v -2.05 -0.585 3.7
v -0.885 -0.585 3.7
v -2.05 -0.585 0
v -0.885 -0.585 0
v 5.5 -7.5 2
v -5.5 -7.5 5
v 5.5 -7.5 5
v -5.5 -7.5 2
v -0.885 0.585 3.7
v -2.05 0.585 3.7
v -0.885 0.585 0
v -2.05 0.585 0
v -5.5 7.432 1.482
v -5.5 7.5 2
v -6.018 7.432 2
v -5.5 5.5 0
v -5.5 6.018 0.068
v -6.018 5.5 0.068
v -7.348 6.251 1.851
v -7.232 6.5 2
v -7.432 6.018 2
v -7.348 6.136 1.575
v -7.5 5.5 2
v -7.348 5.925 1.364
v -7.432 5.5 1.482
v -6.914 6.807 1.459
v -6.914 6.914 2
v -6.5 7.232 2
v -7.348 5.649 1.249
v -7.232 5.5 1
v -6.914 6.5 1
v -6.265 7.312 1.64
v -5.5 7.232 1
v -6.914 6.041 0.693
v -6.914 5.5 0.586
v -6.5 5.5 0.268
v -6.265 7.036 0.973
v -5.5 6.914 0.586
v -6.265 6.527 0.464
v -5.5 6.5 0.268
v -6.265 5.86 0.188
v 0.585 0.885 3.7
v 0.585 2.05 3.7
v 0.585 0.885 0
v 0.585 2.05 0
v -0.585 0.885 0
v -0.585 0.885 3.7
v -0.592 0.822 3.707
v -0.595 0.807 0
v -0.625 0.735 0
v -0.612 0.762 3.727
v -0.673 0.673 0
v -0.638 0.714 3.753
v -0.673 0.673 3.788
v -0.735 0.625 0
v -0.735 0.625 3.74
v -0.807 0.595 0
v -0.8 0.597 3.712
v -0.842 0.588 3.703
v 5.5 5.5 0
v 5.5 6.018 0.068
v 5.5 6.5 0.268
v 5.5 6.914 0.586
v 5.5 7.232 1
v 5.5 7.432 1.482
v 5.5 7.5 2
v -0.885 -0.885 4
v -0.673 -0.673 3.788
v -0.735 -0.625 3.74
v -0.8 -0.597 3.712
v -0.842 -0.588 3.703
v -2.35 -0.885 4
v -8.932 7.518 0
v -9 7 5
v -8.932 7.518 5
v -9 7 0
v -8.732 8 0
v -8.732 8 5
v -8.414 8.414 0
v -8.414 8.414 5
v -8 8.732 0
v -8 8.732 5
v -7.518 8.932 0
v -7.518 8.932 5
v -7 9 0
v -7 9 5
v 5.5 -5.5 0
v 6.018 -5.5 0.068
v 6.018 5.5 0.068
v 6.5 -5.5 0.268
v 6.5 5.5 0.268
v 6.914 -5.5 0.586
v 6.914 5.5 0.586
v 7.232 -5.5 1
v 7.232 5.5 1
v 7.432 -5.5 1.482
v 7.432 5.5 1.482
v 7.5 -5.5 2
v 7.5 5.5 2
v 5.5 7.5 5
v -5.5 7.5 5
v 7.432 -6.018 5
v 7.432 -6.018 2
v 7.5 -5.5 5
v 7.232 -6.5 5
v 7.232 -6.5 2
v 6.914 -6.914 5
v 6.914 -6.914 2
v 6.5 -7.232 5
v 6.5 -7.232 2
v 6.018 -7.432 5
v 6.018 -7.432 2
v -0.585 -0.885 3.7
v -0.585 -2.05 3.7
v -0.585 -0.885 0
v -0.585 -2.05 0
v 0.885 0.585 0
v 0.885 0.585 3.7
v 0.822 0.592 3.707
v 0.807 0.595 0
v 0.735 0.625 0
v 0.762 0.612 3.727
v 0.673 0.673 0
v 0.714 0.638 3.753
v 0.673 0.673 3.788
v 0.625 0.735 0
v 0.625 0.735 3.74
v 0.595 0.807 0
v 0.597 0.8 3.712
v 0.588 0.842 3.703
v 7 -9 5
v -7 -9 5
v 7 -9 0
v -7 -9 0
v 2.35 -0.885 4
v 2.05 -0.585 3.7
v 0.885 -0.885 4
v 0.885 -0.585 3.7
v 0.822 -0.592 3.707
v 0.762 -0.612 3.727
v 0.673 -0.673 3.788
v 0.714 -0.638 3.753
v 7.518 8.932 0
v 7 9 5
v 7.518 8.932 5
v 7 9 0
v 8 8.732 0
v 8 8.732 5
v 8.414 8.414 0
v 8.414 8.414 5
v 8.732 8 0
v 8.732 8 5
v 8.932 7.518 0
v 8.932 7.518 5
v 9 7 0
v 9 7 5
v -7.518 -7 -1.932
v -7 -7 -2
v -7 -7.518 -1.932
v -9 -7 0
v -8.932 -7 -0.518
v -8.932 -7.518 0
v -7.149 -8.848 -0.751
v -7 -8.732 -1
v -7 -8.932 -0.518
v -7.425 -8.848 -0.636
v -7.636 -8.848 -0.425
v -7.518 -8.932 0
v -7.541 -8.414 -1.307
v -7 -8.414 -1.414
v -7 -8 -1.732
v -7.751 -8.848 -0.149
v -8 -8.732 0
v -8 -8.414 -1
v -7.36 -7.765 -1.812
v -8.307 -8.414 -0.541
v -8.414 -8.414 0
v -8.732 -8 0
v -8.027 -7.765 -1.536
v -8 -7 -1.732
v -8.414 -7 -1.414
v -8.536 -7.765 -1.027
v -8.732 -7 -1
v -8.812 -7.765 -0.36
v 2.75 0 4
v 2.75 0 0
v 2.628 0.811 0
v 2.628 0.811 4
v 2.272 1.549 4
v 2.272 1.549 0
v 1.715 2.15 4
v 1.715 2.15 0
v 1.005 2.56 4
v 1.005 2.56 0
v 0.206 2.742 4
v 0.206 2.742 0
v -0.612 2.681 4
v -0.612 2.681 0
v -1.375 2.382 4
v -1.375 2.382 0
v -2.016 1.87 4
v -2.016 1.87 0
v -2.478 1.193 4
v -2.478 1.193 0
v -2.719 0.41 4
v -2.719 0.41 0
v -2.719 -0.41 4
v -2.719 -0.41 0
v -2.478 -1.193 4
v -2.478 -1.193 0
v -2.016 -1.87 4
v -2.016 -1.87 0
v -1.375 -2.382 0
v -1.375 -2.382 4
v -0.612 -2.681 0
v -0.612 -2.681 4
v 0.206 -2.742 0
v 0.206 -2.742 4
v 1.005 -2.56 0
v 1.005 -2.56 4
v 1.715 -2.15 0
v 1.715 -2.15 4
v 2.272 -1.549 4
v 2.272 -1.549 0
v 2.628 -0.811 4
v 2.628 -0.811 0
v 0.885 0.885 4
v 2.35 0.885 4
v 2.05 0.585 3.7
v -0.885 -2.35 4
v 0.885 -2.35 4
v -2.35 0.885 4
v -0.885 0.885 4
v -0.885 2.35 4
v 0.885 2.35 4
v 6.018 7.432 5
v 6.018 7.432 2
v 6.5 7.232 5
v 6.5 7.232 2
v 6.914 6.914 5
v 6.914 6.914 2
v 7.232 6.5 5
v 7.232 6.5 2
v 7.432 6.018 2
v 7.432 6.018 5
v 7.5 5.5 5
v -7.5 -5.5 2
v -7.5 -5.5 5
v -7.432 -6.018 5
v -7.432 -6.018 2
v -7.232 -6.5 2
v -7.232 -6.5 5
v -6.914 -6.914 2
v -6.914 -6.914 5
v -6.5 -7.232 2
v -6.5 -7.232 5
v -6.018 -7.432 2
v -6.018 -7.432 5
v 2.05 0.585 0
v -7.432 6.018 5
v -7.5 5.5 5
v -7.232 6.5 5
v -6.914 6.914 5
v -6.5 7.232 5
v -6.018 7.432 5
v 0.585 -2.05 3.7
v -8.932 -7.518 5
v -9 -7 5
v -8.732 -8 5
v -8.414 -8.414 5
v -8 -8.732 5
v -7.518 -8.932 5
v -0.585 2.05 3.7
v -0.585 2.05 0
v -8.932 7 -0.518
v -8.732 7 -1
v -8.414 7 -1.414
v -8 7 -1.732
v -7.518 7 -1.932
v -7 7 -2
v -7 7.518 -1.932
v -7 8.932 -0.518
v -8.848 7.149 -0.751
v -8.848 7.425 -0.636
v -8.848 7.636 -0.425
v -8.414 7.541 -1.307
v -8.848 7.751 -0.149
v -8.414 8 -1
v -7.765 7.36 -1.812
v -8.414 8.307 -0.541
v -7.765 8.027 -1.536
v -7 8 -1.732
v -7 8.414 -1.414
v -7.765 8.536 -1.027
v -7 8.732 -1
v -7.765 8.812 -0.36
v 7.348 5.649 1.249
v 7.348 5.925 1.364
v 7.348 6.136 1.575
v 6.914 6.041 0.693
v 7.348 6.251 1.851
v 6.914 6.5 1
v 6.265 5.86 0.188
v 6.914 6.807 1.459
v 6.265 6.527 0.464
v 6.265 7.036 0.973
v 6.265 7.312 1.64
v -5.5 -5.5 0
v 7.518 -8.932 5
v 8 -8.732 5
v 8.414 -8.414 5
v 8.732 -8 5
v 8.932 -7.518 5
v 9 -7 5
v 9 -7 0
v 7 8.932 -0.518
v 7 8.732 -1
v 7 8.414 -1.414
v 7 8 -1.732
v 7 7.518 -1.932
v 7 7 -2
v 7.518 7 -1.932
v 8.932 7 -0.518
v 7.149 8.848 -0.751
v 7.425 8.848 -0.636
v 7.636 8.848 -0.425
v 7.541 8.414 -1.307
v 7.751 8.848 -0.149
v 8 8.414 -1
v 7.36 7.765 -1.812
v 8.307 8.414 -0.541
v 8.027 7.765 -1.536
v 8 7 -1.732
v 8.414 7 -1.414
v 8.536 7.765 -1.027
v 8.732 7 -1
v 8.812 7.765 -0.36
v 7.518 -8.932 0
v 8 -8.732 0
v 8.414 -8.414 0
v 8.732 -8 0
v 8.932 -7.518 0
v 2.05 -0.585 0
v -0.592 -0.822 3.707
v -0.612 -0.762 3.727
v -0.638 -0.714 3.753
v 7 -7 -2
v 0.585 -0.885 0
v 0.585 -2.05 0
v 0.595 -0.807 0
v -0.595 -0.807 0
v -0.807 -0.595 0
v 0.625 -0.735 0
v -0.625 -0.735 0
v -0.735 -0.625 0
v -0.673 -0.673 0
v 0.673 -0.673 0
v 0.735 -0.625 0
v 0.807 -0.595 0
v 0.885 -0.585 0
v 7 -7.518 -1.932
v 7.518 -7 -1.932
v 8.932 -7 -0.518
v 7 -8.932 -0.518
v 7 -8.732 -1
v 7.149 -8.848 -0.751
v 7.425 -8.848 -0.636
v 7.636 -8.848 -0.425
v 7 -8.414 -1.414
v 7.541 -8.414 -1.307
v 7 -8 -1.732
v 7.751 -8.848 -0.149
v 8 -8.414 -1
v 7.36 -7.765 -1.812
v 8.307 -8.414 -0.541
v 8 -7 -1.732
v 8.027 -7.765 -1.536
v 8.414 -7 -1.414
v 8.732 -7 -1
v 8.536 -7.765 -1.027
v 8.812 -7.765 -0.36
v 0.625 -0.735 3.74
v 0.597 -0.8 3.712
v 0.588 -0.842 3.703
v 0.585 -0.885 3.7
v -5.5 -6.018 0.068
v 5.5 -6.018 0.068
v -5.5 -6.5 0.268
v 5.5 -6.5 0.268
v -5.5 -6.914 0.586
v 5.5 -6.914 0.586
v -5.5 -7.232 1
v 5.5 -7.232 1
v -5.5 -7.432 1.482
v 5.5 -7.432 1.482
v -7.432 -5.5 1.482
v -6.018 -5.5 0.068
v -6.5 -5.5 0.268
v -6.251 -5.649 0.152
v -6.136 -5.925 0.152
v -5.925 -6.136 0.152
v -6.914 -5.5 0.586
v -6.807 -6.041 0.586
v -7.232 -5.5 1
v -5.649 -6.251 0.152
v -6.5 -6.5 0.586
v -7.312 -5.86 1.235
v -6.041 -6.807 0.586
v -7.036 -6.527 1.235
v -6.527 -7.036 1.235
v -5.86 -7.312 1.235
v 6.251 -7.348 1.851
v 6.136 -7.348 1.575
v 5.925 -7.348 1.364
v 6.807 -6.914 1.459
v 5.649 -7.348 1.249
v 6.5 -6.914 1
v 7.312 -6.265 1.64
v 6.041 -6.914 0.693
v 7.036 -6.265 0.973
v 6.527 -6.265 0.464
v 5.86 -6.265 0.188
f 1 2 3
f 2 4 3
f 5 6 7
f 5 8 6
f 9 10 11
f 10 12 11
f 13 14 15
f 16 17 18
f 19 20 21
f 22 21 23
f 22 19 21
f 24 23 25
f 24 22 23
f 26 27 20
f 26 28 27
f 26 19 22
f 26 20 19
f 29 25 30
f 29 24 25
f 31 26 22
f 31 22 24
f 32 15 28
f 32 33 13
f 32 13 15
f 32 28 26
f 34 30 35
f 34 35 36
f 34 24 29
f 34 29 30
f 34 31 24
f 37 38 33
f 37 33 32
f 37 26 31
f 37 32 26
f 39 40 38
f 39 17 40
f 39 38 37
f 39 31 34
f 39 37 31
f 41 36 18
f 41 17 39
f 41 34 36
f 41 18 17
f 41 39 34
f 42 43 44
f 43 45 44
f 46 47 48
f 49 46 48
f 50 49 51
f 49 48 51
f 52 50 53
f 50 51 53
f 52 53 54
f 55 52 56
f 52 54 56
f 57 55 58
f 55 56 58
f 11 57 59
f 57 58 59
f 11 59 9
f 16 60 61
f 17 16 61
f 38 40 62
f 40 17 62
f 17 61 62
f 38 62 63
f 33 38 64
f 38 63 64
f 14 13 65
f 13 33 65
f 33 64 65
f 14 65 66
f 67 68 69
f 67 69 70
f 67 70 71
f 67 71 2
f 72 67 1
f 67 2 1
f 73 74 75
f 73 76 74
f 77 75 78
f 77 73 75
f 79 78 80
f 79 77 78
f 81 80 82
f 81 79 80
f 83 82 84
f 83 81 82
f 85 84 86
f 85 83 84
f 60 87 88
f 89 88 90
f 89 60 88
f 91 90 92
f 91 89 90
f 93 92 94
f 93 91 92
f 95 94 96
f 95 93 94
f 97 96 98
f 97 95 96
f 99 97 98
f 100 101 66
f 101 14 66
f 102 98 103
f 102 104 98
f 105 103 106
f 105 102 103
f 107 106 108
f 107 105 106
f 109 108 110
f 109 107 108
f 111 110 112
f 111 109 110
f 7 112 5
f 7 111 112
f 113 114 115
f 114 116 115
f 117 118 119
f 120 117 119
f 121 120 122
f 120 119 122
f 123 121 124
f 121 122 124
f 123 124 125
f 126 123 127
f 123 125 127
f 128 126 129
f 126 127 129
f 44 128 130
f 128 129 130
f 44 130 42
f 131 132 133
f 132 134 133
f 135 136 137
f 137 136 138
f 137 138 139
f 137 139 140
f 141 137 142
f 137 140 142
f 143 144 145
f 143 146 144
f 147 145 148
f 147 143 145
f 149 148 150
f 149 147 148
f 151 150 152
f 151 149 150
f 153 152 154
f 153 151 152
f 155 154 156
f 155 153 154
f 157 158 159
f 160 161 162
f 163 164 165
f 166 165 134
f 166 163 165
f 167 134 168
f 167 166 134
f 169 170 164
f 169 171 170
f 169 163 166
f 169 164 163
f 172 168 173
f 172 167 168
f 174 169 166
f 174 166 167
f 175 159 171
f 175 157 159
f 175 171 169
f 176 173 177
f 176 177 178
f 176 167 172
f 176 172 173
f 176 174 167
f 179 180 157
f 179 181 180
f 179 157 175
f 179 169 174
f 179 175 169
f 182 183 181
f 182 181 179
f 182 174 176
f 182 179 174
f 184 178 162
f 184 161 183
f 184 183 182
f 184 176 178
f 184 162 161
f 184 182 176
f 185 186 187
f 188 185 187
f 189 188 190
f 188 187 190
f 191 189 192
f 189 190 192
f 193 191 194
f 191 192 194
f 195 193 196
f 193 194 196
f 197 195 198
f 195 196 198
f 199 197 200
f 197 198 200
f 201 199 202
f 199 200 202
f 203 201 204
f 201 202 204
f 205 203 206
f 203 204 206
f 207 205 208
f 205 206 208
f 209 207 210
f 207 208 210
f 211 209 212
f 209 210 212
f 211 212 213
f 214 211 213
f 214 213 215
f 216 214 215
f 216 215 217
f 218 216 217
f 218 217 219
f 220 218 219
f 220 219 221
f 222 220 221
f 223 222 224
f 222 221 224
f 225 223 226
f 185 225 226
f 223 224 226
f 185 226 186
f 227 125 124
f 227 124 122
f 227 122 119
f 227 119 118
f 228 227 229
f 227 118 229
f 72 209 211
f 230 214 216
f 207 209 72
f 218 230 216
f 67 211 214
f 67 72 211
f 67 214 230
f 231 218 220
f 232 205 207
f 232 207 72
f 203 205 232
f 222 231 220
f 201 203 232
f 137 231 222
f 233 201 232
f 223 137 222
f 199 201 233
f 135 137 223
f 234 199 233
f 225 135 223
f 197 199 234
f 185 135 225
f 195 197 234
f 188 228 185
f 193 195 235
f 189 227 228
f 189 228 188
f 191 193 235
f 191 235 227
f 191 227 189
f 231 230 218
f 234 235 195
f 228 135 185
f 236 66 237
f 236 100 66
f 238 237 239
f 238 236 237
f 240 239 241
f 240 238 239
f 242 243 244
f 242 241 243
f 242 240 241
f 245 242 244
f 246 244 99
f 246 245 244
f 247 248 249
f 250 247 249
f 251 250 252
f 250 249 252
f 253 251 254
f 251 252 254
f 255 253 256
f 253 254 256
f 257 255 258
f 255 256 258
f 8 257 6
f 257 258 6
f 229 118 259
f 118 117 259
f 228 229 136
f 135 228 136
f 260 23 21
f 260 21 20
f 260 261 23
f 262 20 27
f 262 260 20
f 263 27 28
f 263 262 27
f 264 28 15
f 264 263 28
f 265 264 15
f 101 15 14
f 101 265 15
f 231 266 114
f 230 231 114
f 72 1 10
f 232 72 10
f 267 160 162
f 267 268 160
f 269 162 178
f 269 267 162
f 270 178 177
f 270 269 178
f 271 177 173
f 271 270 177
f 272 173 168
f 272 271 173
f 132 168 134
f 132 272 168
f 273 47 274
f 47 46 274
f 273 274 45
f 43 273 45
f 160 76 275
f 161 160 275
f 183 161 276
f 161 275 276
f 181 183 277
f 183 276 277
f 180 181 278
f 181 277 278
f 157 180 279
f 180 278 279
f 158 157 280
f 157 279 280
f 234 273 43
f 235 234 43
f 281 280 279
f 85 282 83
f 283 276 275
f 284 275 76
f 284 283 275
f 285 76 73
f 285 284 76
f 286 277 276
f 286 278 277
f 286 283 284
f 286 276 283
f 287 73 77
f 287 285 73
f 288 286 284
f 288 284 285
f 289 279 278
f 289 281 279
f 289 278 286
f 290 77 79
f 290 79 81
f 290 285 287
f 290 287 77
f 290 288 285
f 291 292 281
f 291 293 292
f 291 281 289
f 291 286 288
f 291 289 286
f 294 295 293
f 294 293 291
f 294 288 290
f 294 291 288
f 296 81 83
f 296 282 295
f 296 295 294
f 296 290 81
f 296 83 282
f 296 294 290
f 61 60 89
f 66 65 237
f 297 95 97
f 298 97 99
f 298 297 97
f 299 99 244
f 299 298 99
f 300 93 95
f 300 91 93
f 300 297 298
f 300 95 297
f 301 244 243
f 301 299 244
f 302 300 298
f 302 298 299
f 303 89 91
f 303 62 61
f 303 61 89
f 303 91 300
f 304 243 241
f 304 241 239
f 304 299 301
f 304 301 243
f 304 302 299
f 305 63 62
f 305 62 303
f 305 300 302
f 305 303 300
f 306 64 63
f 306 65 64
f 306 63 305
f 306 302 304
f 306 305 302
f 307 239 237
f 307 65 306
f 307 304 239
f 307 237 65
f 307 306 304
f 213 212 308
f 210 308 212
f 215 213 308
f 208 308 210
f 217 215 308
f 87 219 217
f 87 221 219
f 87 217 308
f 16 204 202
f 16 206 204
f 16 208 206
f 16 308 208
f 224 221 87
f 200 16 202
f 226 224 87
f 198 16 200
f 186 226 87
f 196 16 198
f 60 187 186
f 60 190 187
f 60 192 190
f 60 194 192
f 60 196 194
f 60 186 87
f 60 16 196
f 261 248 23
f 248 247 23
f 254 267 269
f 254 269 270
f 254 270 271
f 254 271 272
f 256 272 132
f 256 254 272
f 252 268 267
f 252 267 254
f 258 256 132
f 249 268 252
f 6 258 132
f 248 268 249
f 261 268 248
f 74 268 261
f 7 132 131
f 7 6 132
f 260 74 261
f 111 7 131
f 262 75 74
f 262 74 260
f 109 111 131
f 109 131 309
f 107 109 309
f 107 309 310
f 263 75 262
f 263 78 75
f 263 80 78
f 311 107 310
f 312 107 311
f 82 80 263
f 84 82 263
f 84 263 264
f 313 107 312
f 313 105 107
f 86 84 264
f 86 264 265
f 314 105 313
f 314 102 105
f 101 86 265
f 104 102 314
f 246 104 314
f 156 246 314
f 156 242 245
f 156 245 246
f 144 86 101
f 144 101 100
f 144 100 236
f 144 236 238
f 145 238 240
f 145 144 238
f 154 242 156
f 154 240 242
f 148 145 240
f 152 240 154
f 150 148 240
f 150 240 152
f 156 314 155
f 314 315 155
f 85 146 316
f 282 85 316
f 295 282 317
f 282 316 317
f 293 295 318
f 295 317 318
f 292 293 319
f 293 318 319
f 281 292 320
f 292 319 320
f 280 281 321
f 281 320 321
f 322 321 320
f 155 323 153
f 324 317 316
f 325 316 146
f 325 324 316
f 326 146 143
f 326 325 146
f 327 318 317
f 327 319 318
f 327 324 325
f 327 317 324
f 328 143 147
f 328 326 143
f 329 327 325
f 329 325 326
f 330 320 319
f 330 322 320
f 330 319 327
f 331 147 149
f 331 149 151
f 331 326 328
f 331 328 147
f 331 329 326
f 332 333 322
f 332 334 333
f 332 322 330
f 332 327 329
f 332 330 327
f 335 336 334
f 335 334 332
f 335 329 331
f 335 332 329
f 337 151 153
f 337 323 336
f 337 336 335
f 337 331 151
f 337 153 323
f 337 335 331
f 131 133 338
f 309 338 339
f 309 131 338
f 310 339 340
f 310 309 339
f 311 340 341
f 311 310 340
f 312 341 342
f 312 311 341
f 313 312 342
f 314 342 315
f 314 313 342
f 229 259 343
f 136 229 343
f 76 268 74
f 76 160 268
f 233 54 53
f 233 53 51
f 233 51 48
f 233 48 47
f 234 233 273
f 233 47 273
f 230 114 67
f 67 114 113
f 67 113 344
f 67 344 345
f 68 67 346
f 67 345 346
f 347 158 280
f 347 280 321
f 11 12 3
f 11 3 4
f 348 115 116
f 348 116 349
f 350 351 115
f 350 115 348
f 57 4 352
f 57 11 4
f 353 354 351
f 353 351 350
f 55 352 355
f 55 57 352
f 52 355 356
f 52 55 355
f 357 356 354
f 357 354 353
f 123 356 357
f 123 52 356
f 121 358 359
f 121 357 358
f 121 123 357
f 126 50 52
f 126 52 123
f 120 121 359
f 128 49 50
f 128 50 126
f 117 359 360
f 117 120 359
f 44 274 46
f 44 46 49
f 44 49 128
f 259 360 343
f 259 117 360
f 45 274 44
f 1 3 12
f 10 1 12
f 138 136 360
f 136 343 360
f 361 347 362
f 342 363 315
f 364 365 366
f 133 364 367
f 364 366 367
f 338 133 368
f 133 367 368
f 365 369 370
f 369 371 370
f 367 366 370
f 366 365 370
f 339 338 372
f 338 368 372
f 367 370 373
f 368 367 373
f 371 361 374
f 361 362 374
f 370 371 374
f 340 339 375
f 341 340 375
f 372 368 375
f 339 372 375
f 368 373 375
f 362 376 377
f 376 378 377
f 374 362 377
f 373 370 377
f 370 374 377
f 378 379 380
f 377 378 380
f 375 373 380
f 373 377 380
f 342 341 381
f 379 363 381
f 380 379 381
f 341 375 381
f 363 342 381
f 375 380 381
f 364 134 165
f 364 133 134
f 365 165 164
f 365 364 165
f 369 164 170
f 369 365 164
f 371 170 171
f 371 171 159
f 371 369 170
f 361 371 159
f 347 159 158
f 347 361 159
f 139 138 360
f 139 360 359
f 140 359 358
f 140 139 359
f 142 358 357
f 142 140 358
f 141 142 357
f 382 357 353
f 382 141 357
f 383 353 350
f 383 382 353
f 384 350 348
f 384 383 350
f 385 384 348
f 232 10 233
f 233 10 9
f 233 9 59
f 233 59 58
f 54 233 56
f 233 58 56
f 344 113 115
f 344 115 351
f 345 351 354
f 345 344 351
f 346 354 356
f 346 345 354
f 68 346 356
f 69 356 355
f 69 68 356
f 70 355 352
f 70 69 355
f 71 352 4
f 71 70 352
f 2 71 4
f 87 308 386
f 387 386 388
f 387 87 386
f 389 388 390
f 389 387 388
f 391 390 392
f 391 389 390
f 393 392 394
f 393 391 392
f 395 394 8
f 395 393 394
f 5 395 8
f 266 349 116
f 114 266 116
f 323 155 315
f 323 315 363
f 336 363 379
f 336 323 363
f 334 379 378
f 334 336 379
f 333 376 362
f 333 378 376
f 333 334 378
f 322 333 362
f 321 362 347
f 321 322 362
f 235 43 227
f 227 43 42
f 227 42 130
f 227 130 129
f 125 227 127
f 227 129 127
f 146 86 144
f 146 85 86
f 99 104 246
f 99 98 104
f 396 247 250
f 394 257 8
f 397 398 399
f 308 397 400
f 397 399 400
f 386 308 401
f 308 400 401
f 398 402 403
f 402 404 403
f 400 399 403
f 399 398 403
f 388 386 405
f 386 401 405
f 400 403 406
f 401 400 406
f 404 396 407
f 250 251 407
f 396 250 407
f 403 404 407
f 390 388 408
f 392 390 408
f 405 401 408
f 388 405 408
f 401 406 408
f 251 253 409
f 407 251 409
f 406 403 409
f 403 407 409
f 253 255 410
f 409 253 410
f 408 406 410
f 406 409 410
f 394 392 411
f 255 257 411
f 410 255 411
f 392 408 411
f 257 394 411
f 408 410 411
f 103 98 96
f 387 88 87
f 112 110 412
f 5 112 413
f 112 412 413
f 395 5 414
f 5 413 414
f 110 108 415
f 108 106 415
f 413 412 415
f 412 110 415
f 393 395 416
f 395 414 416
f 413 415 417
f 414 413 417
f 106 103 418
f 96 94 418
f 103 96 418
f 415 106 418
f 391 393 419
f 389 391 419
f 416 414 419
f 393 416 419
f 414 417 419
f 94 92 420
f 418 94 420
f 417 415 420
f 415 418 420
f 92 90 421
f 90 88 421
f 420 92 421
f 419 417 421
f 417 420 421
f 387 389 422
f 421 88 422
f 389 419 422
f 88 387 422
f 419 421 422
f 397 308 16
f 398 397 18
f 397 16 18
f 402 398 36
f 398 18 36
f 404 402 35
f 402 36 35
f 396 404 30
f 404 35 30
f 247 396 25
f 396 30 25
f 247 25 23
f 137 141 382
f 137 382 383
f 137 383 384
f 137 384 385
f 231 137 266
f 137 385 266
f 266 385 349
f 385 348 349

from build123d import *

# Parameters (mm, degrees)
SKETCH1_W           = 18
SKETCH1_H           = 18
BOSS_EXTRUDE1_DEPTH = 2
SKETCH1_4_R         = 2.75
BOSS_EXTRUDE2_DEPTH = 4
SKETCH1_5_W         = 18
SKETCH1_5_H         = 18
SKETCH1_5_W_2       = 15
SKETCH1_5_H_2       = 15
BOSS_EXTRUDE3_DEPTH = 5
CHAMFER1_SIZE       = 0.3
FILLET3_R           = 0.3
FILLET4_R           = 2


with BuildPart() as part:
    # Sketch1 → Boss-Extrude1 (new body)
    with BuildSketch(Plane.XY):
        Rectangle(SKETCH1_W, SKETCH1_H)
    extrude(amount=-BOSS_EXTRUDE1_DEPTH)

    # Sketch1<4> → Boss-Extrude2 (add)
    with BuildSketch(Plane.XY):
        Circle(SKETCH1_4_R)
        Polygon((-0.585, 0.585), (-0.585, 2.05), (0.585, 2.05), (0.585, 0.585), (2.05, 0.585), (2.05, -0.585), (0.585, -0.585), (0.585, -2.05), (-0.585, -2.05), (-0.585, -0.585), (-2.05, -0.585), (-2.05, 0.585), align=None, mode=Mode.SUBTRACT)
    extrude(amount=BOSS_EXTRUDE2_DEPTH)

    # Sketch1<5> → Boss-Extrude3 (add)
    with BuildSketch(Plane.XY):
        Rectangle(SKETCH1_5_W, SKETCH1_5_H)
        Rectangle(SKETCH1_5_W_2, SKETCH1_5_H_2, mode=Mode.SUBTRACT)
    extrude(amount=BOSS_EXTRUDE3_DEPTH)

    # Chamfer1
    chamfer1_edges = [part.edges().sort_by_distance(p)[0] for p in [
        (1.3175, -0.585, 4),
        (0, -2.05, 4),
        (-0.585, -1.3175, 4),
        (-1.3175, -0.585, 4),
        (-2.05, 0, 4),
        (-0.585, 1.3175, 4),
        (1.3175, 0.585, 4),
        (2.05, 0, 4),
        (0.585, -1.3175, 4),
        (-1.3175, 0.585, 4),
        (0, 2.05, 4),
        (0.585, 1.3175, 4),
    ]]
    chamfer(chamfer1_edges, length=CHAMFER1_SIZE)

    # Fillet3
    fillet3_edges = [part.edges().sort_by_distance(p)[0] for p in [
        (0.585, 0.585, 1.85),
        (0.585, -0.585, 1.85),
        (-0.585, -0.585, 1.85),
        (-0.585, 0.585, 1.85),
    ]]
    fillet(fillet3_edges, radius=FILLET3_R)

    # Fillet4
    fillet4_edges = [part.edges().sort_by_distance(p)[0] for p in [
        (9, 0, -2),
        (0, 9, -2),
        (-9, 0, -2),
        (0, 7.5, 0),
        (-7.5, 7.5, 2.5),
        (7.5, 0, 0),
        (7.5, 7.5, 2.5),
        (7.5, -7.5, 2.5),
        (-7.5, -7.5, 2.5),
        (-7.5, 0, 0),
        (0, -7.5, 0),
        (0, -9, -2),
        (-9, 9, 1.5),
        (9, 9, 1.5),
        (9, -9, 1.5),
        (-9, -9, 1.5),
    ]]
    fillet(fillet4_edges, radius=FILLET4_R)


solid = part.part
